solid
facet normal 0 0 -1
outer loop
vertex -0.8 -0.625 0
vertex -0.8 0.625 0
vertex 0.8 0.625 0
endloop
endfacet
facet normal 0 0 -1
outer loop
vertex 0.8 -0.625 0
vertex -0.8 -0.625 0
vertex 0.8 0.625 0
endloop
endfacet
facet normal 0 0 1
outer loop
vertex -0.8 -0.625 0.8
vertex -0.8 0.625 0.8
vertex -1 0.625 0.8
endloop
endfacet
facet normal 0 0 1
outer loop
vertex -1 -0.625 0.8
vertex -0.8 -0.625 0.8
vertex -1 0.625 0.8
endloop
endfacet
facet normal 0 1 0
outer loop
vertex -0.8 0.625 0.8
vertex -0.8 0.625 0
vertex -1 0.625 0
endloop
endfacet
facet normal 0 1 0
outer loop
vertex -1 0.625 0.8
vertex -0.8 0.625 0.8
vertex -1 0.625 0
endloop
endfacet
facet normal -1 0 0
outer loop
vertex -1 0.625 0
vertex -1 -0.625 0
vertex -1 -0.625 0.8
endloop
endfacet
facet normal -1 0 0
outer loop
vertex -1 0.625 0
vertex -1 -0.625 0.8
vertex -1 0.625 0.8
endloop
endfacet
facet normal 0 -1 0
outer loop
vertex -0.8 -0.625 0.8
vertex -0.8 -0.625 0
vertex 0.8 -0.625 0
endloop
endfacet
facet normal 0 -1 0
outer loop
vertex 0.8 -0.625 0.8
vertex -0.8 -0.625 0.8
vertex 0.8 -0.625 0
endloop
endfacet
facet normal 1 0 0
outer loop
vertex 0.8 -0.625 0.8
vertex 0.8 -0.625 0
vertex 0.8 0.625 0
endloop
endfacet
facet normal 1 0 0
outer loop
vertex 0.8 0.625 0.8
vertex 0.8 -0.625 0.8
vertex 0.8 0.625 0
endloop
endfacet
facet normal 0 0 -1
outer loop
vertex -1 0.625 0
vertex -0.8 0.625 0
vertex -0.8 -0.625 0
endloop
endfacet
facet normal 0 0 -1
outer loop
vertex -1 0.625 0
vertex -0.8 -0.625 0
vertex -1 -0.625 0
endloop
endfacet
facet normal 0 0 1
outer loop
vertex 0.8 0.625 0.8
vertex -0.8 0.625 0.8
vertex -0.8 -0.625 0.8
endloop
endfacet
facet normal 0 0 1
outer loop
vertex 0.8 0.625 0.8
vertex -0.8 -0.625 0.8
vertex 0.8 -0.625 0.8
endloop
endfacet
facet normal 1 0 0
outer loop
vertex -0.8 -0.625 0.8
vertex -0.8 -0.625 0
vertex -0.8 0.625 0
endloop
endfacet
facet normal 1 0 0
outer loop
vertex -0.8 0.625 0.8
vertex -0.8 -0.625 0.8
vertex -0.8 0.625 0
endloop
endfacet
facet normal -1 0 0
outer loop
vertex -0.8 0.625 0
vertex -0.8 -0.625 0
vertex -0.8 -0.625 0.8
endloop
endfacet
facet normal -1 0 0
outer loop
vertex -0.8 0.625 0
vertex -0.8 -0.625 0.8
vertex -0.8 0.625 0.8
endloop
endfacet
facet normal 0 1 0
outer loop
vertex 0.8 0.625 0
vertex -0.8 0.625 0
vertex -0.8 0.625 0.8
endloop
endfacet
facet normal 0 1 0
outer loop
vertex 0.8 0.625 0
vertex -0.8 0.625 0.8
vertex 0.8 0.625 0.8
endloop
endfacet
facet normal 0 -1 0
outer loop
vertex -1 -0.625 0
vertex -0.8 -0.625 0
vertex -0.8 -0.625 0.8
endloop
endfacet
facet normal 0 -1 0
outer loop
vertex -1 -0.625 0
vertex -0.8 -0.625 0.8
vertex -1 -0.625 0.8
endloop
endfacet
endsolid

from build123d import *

# Parameters (mm, degrees)
SKETCH_W     = 1.6
SKETCH_H     = 1.25
PAD_DEPTH    = 0.8
SKETCH001_W  = 0.2
SKETCH001_H  = 1.25
PAD001_DEPTH = 0.8


with BuildPart() as body:
    # Sketch → Pad (new body)
    with BuildSketch(Plane.XY):
        Rectangle(SKETCH_W, SKETCH_H)
    extrude(amount=PAD_DEPTH)


with BuildPart() as body001:
    # Sketch001 → Pad001 (new body)
    with BuildSketch(Plane.XY):
        with Locations((0.9, 0)):
            Rectangle(SKETCH001_W, SKETCH001_H)
    extrude(amount=PAD001_DEPTH)


with BuildPart() as part_mirroring:
    # Part__Mirroring: instance of Body001
    add(body001.part.mirror(Plane(origin=(0, 0, 0), x_dir=(0, -1, 0), z_dir=(1, 0, 0))))


solid = Compound([body.part, part_mirroring.part])
